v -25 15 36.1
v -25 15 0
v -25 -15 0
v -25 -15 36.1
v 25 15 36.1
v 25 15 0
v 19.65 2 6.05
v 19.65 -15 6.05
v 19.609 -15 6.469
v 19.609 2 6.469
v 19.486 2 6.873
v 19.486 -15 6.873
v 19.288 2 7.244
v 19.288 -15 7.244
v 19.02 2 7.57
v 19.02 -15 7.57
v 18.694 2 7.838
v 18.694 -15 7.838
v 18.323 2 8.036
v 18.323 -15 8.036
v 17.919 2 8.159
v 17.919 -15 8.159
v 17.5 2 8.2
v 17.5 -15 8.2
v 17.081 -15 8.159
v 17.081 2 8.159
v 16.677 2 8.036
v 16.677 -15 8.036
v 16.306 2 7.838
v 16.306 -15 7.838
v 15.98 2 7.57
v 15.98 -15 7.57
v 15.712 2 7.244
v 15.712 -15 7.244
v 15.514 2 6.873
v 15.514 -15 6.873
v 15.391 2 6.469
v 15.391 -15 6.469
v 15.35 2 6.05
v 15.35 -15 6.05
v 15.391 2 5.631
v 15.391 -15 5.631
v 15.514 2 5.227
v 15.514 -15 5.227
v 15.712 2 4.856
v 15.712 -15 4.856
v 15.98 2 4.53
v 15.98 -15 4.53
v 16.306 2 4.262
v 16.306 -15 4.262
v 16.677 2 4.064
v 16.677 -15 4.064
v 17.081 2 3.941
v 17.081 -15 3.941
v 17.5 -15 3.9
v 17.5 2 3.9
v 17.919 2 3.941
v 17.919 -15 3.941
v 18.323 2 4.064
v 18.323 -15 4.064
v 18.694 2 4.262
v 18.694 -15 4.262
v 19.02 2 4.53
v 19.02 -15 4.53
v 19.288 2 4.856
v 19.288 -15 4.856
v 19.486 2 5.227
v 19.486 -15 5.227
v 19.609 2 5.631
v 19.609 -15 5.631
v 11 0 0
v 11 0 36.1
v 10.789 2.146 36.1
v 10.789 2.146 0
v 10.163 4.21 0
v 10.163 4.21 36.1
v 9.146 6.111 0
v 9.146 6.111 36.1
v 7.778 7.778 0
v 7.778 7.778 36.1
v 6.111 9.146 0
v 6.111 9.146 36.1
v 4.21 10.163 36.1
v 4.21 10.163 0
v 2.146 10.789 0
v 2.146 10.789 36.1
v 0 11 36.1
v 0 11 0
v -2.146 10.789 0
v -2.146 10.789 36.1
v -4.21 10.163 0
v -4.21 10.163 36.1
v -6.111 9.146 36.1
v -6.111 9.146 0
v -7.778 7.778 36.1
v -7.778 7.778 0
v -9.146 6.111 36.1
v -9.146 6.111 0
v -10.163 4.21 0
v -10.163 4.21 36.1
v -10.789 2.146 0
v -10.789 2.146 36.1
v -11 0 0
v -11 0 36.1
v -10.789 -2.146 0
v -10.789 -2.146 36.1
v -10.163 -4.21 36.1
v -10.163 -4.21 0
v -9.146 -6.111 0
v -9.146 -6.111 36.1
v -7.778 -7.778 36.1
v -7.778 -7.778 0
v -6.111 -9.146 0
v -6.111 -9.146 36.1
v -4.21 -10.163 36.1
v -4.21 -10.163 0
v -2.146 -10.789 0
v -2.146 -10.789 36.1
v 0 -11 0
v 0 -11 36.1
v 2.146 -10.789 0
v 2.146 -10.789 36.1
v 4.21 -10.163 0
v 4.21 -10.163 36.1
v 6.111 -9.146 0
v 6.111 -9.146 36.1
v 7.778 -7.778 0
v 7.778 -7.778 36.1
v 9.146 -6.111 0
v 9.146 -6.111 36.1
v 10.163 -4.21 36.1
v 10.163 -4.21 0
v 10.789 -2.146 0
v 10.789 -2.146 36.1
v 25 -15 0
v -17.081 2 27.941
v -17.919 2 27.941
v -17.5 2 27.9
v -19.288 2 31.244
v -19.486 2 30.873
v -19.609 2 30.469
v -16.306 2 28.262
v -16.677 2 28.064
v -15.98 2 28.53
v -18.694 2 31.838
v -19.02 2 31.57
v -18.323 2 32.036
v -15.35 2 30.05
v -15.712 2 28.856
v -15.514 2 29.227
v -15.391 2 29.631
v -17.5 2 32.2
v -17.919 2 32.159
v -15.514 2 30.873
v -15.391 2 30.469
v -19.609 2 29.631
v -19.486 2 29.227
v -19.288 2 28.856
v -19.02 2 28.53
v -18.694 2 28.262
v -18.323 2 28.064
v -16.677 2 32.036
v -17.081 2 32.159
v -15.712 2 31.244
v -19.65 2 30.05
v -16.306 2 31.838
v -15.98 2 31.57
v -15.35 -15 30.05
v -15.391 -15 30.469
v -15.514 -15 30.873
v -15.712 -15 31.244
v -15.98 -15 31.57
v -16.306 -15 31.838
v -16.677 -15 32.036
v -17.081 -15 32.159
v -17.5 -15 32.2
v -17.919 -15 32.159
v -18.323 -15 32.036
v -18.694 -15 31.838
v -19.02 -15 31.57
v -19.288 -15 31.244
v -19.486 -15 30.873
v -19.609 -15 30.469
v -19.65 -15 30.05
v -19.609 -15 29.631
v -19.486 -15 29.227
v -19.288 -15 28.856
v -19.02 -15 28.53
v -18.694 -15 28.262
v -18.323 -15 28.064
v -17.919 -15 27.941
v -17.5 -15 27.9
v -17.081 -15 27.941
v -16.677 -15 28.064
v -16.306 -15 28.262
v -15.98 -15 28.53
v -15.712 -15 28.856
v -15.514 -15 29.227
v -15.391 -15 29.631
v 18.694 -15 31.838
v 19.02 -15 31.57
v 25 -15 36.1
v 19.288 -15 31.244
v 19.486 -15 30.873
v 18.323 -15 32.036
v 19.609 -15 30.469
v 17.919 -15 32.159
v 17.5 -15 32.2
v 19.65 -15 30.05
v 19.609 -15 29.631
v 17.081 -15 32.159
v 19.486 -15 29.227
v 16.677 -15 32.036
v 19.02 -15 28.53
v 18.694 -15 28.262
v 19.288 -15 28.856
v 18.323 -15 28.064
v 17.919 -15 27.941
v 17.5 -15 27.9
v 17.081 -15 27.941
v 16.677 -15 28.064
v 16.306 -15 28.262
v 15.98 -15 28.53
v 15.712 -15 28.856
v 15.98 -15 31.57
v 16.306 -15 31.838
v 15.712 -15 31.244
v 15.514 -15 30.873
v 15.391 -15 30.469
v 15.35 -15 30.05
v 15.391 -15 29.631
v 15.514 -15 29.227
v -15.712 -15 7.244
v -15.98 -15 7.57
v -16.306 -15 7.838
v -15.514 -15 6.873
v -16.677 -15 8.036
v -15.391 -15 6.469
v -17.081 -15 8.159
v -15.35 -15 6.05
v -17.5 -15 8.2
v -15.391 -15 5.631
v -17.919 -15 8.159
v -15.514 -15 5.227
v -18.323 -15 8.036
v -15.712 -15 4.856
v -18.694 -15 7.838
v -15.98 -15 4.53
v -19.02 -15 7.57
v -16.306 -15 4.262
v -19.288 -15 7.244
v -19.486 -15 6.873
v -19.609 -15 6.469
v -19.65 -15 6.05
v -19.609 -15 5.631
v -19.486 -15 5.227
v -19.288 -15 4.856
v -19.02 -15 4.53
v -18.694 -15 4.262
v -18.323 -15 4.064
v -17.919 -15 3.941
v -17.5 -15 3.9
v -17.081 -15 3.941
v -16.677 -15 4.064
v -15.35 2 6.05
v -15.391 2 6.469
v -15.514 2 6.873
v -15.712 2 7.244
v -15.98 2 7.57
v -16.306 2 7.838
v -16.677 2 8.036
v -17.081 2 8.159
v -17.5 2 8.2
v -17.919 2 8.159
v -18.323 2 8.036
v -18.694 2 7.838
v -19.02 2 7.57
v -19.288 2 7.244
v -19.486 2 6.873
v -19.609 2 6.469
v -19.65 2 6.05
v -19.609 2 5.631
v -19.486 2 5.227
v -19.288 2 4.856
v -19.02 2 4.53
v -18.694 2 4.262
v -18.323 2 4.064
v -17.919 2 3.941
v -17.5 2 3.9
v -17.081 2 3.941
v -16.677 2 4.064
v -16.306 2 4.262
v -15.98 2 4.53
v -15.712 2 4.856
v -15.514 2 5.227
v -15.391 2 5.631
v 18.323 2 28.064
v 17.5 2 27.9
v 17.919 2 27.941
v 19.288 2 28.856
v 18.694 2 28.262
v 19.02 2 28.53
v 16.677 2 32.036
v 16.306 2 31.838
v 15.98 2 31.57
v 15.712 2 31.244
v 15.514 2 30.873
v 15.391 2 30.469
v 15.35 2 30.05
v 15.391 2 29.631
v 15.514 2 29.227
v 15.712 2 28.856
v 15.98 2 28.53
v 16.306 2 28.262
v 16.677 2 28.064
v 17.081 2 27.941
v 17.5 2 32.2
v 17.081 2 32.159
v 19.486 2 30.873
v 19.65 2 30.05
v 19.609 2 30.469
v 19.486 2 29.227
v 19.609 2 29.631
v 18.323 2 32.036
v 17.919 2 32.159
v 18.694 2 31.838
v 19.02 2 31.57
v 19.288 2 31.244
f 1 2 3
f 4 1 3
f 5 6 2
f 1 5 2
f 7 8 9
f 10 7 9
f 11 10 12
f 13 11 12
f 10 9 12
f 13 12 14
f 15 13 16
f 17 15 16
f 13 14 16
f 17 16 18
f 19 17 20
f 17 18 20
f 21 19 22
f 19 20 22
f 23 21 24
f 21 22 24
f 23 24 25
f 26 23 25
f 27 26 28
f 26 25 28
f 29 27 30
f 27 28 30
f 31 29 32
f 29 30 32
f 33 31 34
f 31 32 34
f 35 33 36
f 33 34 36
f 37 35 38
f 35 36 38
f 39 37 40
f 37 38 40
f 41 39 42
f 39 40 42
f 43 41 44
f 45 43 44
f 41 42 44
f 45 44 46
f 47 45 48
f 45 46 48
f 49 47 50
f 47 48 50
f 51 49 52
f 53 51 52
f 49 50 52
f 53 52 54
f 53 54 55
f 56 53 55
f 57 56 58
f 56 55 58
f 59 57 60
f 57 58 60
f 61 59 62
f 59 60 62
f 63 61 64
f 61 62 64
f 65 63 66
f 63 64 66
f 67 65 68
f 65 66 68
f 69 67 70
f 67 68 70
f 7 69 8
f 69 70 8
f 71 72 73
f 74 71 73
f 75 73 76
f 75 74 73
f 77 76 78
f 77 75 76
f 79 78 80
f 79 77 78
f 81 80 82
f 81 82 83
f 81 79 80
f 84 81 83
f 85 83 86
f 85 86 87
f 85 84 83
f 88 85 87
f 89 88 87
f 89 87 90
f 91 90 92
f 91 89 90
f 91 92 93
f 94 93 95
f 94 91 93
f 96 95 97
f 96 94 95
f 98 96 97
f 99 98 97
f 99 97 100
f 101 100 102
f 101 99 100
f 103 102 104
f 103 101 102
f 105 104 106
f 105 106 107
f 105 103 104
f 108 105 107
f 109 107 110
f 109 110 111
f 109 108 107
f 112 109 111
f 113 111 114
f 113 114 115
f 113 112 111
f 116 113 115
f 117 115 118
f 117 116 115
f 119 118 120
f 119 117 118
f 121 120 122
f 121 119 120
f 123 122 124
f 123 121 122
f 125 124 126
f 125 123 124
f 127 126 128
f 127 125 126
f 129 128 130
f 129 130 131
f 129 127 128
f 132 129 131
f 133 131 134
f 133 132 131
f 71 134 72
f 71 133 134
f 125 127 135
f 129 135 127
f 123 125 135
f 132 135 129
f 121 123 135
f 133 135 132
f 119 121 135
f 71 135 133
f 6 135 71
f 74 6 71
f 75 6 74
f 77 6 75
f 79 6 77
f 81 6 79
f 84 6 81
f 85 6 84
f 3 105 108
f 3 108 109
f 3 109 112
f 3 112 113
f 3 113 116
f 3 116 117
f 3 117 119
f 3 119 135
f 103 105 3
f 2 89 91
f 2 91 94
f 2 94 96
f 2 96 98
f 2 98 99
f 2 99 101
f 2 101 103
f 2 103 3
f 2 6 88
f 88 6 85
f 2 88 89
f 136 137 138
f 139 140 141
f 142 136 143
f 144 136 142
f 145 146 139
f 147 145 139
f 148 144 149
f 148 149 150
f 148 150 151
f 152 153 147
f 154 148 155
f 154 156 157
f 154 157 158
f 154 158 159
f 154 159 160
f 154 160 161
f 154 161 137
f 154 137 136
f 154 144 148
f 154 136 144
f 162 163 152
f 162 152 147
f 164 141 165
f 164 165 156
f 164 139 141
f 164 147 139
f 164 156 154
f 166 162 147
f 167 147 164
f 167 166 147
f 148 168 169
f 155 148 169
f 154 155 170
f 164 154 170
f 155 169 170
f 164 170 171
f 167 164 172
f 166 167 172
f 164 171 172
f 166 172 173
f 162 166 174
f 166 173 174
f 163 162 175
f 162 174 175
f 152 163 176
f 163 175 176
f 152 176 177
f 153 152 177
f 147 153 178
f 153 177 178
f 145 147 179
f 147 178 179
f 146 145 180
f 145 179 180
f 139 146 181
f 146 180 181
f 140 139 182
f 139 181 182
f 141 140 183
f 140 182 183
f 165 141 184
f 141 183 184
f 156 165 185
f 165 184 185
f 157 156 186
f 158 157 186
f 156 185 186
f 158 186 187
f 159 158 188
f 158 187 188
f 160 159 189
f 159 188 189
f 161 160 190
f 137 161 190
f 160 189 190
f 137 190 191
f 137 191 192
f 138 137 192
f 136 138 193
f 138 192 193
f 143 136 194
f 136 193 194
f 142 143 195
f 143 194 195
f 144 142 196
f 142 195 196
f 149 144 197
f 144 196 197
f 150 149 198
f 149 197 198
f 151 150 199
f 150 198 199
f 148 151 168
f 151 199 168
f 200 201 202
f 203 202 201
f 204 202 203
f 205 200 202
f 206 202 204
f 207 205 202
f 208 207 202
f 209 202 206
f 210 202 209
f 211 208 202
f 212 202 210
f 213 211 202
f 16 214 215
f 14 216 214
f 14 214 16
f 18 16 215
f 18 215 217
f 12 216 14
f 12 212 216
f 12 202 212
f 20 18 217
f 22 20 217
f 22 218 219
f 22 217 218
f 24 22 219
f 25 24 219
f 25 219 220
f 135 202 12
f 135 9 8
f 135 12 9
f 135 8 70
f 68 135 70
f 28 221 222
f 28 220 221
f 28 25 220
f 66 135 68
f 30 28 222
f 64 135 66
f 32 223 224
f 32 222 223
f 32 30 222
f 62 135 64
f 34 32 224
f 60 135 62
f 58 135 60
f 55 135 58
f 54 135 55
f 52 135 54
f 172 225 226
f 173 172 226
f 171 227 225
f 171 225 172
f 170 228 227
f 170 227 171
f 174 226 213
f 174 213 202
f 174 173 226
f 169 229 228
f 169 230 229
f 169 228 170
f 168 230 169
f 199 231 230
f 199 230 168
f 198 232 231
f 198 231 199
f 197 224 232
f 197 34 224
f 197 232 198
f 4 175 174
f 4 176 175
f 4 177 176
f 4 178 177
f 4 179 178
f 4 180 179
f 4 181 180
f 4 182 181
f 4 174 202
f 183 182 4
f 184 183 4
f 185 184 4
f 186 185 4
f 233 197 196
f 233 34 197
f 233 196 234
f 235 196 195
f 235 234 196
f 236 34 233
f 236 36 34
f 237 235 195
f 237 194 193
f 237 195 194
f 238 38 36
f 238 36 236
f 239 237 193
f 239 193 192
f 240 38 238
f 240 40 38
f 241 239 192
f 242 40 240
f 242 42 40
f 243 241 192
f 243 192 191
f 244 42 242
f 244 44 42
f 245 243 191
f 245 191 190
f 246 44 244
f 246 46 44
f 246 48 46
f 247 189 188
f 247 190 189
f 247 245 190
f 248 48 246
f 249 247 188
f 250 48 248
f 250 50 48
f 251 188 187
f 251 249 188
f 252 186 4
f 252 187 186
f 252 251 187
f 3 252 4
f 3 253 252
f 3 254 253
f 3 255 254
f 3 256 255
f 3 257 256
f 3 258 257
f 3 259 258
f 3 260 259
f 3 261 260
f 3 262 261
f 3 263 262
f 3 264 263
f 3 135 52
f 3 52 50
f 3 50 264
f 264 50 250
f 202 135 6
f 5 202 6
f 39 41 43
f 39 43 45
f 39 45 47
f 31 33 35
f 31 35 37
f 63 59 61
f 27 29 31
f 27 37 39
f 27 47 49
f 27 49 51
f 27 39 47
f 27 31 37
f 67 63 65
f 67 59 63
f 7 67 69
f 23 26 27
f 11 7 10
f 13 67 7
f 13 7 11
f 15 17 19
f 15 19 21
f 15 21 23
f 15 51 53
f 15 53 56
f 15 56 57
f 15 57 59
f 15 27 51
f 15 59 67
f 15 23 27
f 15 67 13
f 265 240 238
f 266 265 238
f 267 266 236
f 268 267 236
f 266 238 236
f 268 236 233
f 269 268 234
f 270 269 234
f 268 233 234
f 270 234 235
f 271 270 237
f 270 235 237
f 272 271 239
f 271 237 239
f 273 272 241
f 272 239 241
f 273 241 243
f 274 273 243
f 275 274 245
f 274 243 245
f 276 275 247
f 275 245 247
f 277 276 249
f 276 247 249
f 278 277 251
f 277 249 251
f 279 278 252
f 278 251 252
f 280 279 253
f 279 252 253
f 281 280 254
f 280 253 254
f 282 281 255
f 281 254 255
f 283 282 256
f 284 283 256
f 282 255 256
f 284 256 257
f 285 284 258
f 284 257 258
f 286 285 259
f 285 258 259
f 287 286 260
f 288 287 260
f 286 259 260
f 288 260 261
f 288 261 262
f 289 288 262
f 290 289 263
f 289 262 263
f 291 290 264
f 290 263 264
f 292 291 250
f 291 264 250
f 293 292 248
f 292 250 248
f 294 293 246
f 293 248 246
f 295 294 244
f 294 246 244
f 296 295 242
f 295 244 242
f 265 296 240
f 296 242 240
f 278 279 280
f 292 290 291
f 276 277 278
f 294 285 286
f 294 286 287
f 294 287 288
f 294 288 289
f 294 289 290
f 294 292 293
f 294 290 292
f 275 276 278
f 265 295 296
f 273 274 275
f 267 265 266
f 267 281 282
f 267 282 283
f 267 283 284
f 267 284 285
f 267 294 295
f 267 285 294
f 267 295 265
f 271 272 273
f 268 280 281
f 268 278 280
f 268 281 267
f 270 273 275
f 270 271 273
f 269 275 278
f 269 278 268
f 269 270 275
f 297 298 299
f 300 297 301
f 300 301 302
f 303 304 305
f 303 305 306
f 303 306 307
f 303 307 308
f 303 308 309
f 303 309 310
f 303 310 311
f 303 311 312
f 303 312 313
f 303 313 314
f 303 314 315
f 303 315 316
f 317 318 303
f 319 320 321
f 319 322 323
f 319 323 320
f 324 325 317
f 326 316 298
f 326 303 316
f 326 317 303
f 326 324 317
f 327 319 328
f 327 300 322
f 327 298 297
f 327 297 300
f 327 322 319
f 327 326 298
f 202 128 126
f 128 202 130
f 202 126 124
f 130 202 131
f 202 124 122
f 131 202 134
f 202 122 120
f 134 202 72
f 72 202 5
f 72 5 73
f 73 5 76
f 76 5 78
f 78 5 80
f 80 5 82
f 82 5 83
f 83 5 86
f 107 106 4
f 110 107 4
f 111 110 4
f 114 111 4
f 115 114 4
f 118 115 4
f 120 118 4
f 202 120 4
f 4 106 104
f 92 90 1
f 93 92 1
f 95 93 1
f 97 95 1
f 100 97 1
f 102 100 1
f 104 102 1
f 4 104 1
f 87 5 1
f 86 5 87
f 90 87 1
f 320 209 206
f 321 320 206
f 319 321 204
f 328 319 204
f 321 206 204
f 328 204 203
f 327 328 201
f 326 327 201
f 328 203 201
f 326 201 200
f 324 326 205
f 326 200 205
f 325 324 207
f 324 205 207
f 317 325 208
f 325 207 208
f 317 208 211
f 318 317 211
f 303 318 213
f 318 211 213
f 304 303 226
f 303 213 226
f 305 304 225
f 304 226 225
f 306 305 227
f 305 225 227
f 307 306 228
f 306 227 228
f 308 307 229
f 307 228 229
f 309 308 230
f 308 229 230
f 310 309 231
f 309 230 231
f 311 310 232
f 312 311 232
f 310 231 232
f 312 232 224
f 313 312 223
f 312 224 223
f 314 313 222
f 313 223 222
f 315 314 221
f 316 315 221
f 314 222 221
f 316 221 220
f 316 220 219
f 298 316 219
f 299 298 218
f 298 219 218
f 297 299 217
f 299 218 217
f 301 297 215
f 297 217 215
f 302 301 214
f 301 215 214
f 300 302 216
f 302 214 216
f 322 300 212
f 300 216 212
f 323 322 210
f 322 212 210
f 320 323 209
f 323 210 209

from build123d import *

# Parameters (mm, degrees)
SKETCH1_R           = 11
BOSS_EXTRUDE1_DEPTH = 36.1
SKETCH3_R           = 2.15
CUT_EXTRUDE1_DEPTH  = 17


with BuildPart() as part:
    # Sketch1 → Boss-Extrude1 (new body)
    with BuildSketch(Plane.XY):
        Polygon((-15, 15), (15, 15), (25, 15), (25, 5), (25, -15), (-25, -15), (-25, 5), (-25, 15), align=None)
        Circle(SKETCH1_R, mode=Mode.SUBTRACT)
    extrude(amount=BOSS_EXTRUDE1_DEPTH)

    # Sketch3 → Cut-Extrude1 (cut)
    with BuildSketch(Plane.XZ.offset(15)):
        with Locations((-17.5, 30.05)):
            Circle(SKETCH3_R)
        with Locations((17.5, 30.05)):
            Circle(SKETCH3_R)
        with Locations((17.5, 6.05)):
            Circle(SKETCH3_R)
        with Locations((-17.5, 6.05)):
            Circle(SKETCH3_R)
    extrude(amount=-CUT_EXTRUDE1_DEPTH, mode=Mode.SUBTRACT)


solid = part.part
